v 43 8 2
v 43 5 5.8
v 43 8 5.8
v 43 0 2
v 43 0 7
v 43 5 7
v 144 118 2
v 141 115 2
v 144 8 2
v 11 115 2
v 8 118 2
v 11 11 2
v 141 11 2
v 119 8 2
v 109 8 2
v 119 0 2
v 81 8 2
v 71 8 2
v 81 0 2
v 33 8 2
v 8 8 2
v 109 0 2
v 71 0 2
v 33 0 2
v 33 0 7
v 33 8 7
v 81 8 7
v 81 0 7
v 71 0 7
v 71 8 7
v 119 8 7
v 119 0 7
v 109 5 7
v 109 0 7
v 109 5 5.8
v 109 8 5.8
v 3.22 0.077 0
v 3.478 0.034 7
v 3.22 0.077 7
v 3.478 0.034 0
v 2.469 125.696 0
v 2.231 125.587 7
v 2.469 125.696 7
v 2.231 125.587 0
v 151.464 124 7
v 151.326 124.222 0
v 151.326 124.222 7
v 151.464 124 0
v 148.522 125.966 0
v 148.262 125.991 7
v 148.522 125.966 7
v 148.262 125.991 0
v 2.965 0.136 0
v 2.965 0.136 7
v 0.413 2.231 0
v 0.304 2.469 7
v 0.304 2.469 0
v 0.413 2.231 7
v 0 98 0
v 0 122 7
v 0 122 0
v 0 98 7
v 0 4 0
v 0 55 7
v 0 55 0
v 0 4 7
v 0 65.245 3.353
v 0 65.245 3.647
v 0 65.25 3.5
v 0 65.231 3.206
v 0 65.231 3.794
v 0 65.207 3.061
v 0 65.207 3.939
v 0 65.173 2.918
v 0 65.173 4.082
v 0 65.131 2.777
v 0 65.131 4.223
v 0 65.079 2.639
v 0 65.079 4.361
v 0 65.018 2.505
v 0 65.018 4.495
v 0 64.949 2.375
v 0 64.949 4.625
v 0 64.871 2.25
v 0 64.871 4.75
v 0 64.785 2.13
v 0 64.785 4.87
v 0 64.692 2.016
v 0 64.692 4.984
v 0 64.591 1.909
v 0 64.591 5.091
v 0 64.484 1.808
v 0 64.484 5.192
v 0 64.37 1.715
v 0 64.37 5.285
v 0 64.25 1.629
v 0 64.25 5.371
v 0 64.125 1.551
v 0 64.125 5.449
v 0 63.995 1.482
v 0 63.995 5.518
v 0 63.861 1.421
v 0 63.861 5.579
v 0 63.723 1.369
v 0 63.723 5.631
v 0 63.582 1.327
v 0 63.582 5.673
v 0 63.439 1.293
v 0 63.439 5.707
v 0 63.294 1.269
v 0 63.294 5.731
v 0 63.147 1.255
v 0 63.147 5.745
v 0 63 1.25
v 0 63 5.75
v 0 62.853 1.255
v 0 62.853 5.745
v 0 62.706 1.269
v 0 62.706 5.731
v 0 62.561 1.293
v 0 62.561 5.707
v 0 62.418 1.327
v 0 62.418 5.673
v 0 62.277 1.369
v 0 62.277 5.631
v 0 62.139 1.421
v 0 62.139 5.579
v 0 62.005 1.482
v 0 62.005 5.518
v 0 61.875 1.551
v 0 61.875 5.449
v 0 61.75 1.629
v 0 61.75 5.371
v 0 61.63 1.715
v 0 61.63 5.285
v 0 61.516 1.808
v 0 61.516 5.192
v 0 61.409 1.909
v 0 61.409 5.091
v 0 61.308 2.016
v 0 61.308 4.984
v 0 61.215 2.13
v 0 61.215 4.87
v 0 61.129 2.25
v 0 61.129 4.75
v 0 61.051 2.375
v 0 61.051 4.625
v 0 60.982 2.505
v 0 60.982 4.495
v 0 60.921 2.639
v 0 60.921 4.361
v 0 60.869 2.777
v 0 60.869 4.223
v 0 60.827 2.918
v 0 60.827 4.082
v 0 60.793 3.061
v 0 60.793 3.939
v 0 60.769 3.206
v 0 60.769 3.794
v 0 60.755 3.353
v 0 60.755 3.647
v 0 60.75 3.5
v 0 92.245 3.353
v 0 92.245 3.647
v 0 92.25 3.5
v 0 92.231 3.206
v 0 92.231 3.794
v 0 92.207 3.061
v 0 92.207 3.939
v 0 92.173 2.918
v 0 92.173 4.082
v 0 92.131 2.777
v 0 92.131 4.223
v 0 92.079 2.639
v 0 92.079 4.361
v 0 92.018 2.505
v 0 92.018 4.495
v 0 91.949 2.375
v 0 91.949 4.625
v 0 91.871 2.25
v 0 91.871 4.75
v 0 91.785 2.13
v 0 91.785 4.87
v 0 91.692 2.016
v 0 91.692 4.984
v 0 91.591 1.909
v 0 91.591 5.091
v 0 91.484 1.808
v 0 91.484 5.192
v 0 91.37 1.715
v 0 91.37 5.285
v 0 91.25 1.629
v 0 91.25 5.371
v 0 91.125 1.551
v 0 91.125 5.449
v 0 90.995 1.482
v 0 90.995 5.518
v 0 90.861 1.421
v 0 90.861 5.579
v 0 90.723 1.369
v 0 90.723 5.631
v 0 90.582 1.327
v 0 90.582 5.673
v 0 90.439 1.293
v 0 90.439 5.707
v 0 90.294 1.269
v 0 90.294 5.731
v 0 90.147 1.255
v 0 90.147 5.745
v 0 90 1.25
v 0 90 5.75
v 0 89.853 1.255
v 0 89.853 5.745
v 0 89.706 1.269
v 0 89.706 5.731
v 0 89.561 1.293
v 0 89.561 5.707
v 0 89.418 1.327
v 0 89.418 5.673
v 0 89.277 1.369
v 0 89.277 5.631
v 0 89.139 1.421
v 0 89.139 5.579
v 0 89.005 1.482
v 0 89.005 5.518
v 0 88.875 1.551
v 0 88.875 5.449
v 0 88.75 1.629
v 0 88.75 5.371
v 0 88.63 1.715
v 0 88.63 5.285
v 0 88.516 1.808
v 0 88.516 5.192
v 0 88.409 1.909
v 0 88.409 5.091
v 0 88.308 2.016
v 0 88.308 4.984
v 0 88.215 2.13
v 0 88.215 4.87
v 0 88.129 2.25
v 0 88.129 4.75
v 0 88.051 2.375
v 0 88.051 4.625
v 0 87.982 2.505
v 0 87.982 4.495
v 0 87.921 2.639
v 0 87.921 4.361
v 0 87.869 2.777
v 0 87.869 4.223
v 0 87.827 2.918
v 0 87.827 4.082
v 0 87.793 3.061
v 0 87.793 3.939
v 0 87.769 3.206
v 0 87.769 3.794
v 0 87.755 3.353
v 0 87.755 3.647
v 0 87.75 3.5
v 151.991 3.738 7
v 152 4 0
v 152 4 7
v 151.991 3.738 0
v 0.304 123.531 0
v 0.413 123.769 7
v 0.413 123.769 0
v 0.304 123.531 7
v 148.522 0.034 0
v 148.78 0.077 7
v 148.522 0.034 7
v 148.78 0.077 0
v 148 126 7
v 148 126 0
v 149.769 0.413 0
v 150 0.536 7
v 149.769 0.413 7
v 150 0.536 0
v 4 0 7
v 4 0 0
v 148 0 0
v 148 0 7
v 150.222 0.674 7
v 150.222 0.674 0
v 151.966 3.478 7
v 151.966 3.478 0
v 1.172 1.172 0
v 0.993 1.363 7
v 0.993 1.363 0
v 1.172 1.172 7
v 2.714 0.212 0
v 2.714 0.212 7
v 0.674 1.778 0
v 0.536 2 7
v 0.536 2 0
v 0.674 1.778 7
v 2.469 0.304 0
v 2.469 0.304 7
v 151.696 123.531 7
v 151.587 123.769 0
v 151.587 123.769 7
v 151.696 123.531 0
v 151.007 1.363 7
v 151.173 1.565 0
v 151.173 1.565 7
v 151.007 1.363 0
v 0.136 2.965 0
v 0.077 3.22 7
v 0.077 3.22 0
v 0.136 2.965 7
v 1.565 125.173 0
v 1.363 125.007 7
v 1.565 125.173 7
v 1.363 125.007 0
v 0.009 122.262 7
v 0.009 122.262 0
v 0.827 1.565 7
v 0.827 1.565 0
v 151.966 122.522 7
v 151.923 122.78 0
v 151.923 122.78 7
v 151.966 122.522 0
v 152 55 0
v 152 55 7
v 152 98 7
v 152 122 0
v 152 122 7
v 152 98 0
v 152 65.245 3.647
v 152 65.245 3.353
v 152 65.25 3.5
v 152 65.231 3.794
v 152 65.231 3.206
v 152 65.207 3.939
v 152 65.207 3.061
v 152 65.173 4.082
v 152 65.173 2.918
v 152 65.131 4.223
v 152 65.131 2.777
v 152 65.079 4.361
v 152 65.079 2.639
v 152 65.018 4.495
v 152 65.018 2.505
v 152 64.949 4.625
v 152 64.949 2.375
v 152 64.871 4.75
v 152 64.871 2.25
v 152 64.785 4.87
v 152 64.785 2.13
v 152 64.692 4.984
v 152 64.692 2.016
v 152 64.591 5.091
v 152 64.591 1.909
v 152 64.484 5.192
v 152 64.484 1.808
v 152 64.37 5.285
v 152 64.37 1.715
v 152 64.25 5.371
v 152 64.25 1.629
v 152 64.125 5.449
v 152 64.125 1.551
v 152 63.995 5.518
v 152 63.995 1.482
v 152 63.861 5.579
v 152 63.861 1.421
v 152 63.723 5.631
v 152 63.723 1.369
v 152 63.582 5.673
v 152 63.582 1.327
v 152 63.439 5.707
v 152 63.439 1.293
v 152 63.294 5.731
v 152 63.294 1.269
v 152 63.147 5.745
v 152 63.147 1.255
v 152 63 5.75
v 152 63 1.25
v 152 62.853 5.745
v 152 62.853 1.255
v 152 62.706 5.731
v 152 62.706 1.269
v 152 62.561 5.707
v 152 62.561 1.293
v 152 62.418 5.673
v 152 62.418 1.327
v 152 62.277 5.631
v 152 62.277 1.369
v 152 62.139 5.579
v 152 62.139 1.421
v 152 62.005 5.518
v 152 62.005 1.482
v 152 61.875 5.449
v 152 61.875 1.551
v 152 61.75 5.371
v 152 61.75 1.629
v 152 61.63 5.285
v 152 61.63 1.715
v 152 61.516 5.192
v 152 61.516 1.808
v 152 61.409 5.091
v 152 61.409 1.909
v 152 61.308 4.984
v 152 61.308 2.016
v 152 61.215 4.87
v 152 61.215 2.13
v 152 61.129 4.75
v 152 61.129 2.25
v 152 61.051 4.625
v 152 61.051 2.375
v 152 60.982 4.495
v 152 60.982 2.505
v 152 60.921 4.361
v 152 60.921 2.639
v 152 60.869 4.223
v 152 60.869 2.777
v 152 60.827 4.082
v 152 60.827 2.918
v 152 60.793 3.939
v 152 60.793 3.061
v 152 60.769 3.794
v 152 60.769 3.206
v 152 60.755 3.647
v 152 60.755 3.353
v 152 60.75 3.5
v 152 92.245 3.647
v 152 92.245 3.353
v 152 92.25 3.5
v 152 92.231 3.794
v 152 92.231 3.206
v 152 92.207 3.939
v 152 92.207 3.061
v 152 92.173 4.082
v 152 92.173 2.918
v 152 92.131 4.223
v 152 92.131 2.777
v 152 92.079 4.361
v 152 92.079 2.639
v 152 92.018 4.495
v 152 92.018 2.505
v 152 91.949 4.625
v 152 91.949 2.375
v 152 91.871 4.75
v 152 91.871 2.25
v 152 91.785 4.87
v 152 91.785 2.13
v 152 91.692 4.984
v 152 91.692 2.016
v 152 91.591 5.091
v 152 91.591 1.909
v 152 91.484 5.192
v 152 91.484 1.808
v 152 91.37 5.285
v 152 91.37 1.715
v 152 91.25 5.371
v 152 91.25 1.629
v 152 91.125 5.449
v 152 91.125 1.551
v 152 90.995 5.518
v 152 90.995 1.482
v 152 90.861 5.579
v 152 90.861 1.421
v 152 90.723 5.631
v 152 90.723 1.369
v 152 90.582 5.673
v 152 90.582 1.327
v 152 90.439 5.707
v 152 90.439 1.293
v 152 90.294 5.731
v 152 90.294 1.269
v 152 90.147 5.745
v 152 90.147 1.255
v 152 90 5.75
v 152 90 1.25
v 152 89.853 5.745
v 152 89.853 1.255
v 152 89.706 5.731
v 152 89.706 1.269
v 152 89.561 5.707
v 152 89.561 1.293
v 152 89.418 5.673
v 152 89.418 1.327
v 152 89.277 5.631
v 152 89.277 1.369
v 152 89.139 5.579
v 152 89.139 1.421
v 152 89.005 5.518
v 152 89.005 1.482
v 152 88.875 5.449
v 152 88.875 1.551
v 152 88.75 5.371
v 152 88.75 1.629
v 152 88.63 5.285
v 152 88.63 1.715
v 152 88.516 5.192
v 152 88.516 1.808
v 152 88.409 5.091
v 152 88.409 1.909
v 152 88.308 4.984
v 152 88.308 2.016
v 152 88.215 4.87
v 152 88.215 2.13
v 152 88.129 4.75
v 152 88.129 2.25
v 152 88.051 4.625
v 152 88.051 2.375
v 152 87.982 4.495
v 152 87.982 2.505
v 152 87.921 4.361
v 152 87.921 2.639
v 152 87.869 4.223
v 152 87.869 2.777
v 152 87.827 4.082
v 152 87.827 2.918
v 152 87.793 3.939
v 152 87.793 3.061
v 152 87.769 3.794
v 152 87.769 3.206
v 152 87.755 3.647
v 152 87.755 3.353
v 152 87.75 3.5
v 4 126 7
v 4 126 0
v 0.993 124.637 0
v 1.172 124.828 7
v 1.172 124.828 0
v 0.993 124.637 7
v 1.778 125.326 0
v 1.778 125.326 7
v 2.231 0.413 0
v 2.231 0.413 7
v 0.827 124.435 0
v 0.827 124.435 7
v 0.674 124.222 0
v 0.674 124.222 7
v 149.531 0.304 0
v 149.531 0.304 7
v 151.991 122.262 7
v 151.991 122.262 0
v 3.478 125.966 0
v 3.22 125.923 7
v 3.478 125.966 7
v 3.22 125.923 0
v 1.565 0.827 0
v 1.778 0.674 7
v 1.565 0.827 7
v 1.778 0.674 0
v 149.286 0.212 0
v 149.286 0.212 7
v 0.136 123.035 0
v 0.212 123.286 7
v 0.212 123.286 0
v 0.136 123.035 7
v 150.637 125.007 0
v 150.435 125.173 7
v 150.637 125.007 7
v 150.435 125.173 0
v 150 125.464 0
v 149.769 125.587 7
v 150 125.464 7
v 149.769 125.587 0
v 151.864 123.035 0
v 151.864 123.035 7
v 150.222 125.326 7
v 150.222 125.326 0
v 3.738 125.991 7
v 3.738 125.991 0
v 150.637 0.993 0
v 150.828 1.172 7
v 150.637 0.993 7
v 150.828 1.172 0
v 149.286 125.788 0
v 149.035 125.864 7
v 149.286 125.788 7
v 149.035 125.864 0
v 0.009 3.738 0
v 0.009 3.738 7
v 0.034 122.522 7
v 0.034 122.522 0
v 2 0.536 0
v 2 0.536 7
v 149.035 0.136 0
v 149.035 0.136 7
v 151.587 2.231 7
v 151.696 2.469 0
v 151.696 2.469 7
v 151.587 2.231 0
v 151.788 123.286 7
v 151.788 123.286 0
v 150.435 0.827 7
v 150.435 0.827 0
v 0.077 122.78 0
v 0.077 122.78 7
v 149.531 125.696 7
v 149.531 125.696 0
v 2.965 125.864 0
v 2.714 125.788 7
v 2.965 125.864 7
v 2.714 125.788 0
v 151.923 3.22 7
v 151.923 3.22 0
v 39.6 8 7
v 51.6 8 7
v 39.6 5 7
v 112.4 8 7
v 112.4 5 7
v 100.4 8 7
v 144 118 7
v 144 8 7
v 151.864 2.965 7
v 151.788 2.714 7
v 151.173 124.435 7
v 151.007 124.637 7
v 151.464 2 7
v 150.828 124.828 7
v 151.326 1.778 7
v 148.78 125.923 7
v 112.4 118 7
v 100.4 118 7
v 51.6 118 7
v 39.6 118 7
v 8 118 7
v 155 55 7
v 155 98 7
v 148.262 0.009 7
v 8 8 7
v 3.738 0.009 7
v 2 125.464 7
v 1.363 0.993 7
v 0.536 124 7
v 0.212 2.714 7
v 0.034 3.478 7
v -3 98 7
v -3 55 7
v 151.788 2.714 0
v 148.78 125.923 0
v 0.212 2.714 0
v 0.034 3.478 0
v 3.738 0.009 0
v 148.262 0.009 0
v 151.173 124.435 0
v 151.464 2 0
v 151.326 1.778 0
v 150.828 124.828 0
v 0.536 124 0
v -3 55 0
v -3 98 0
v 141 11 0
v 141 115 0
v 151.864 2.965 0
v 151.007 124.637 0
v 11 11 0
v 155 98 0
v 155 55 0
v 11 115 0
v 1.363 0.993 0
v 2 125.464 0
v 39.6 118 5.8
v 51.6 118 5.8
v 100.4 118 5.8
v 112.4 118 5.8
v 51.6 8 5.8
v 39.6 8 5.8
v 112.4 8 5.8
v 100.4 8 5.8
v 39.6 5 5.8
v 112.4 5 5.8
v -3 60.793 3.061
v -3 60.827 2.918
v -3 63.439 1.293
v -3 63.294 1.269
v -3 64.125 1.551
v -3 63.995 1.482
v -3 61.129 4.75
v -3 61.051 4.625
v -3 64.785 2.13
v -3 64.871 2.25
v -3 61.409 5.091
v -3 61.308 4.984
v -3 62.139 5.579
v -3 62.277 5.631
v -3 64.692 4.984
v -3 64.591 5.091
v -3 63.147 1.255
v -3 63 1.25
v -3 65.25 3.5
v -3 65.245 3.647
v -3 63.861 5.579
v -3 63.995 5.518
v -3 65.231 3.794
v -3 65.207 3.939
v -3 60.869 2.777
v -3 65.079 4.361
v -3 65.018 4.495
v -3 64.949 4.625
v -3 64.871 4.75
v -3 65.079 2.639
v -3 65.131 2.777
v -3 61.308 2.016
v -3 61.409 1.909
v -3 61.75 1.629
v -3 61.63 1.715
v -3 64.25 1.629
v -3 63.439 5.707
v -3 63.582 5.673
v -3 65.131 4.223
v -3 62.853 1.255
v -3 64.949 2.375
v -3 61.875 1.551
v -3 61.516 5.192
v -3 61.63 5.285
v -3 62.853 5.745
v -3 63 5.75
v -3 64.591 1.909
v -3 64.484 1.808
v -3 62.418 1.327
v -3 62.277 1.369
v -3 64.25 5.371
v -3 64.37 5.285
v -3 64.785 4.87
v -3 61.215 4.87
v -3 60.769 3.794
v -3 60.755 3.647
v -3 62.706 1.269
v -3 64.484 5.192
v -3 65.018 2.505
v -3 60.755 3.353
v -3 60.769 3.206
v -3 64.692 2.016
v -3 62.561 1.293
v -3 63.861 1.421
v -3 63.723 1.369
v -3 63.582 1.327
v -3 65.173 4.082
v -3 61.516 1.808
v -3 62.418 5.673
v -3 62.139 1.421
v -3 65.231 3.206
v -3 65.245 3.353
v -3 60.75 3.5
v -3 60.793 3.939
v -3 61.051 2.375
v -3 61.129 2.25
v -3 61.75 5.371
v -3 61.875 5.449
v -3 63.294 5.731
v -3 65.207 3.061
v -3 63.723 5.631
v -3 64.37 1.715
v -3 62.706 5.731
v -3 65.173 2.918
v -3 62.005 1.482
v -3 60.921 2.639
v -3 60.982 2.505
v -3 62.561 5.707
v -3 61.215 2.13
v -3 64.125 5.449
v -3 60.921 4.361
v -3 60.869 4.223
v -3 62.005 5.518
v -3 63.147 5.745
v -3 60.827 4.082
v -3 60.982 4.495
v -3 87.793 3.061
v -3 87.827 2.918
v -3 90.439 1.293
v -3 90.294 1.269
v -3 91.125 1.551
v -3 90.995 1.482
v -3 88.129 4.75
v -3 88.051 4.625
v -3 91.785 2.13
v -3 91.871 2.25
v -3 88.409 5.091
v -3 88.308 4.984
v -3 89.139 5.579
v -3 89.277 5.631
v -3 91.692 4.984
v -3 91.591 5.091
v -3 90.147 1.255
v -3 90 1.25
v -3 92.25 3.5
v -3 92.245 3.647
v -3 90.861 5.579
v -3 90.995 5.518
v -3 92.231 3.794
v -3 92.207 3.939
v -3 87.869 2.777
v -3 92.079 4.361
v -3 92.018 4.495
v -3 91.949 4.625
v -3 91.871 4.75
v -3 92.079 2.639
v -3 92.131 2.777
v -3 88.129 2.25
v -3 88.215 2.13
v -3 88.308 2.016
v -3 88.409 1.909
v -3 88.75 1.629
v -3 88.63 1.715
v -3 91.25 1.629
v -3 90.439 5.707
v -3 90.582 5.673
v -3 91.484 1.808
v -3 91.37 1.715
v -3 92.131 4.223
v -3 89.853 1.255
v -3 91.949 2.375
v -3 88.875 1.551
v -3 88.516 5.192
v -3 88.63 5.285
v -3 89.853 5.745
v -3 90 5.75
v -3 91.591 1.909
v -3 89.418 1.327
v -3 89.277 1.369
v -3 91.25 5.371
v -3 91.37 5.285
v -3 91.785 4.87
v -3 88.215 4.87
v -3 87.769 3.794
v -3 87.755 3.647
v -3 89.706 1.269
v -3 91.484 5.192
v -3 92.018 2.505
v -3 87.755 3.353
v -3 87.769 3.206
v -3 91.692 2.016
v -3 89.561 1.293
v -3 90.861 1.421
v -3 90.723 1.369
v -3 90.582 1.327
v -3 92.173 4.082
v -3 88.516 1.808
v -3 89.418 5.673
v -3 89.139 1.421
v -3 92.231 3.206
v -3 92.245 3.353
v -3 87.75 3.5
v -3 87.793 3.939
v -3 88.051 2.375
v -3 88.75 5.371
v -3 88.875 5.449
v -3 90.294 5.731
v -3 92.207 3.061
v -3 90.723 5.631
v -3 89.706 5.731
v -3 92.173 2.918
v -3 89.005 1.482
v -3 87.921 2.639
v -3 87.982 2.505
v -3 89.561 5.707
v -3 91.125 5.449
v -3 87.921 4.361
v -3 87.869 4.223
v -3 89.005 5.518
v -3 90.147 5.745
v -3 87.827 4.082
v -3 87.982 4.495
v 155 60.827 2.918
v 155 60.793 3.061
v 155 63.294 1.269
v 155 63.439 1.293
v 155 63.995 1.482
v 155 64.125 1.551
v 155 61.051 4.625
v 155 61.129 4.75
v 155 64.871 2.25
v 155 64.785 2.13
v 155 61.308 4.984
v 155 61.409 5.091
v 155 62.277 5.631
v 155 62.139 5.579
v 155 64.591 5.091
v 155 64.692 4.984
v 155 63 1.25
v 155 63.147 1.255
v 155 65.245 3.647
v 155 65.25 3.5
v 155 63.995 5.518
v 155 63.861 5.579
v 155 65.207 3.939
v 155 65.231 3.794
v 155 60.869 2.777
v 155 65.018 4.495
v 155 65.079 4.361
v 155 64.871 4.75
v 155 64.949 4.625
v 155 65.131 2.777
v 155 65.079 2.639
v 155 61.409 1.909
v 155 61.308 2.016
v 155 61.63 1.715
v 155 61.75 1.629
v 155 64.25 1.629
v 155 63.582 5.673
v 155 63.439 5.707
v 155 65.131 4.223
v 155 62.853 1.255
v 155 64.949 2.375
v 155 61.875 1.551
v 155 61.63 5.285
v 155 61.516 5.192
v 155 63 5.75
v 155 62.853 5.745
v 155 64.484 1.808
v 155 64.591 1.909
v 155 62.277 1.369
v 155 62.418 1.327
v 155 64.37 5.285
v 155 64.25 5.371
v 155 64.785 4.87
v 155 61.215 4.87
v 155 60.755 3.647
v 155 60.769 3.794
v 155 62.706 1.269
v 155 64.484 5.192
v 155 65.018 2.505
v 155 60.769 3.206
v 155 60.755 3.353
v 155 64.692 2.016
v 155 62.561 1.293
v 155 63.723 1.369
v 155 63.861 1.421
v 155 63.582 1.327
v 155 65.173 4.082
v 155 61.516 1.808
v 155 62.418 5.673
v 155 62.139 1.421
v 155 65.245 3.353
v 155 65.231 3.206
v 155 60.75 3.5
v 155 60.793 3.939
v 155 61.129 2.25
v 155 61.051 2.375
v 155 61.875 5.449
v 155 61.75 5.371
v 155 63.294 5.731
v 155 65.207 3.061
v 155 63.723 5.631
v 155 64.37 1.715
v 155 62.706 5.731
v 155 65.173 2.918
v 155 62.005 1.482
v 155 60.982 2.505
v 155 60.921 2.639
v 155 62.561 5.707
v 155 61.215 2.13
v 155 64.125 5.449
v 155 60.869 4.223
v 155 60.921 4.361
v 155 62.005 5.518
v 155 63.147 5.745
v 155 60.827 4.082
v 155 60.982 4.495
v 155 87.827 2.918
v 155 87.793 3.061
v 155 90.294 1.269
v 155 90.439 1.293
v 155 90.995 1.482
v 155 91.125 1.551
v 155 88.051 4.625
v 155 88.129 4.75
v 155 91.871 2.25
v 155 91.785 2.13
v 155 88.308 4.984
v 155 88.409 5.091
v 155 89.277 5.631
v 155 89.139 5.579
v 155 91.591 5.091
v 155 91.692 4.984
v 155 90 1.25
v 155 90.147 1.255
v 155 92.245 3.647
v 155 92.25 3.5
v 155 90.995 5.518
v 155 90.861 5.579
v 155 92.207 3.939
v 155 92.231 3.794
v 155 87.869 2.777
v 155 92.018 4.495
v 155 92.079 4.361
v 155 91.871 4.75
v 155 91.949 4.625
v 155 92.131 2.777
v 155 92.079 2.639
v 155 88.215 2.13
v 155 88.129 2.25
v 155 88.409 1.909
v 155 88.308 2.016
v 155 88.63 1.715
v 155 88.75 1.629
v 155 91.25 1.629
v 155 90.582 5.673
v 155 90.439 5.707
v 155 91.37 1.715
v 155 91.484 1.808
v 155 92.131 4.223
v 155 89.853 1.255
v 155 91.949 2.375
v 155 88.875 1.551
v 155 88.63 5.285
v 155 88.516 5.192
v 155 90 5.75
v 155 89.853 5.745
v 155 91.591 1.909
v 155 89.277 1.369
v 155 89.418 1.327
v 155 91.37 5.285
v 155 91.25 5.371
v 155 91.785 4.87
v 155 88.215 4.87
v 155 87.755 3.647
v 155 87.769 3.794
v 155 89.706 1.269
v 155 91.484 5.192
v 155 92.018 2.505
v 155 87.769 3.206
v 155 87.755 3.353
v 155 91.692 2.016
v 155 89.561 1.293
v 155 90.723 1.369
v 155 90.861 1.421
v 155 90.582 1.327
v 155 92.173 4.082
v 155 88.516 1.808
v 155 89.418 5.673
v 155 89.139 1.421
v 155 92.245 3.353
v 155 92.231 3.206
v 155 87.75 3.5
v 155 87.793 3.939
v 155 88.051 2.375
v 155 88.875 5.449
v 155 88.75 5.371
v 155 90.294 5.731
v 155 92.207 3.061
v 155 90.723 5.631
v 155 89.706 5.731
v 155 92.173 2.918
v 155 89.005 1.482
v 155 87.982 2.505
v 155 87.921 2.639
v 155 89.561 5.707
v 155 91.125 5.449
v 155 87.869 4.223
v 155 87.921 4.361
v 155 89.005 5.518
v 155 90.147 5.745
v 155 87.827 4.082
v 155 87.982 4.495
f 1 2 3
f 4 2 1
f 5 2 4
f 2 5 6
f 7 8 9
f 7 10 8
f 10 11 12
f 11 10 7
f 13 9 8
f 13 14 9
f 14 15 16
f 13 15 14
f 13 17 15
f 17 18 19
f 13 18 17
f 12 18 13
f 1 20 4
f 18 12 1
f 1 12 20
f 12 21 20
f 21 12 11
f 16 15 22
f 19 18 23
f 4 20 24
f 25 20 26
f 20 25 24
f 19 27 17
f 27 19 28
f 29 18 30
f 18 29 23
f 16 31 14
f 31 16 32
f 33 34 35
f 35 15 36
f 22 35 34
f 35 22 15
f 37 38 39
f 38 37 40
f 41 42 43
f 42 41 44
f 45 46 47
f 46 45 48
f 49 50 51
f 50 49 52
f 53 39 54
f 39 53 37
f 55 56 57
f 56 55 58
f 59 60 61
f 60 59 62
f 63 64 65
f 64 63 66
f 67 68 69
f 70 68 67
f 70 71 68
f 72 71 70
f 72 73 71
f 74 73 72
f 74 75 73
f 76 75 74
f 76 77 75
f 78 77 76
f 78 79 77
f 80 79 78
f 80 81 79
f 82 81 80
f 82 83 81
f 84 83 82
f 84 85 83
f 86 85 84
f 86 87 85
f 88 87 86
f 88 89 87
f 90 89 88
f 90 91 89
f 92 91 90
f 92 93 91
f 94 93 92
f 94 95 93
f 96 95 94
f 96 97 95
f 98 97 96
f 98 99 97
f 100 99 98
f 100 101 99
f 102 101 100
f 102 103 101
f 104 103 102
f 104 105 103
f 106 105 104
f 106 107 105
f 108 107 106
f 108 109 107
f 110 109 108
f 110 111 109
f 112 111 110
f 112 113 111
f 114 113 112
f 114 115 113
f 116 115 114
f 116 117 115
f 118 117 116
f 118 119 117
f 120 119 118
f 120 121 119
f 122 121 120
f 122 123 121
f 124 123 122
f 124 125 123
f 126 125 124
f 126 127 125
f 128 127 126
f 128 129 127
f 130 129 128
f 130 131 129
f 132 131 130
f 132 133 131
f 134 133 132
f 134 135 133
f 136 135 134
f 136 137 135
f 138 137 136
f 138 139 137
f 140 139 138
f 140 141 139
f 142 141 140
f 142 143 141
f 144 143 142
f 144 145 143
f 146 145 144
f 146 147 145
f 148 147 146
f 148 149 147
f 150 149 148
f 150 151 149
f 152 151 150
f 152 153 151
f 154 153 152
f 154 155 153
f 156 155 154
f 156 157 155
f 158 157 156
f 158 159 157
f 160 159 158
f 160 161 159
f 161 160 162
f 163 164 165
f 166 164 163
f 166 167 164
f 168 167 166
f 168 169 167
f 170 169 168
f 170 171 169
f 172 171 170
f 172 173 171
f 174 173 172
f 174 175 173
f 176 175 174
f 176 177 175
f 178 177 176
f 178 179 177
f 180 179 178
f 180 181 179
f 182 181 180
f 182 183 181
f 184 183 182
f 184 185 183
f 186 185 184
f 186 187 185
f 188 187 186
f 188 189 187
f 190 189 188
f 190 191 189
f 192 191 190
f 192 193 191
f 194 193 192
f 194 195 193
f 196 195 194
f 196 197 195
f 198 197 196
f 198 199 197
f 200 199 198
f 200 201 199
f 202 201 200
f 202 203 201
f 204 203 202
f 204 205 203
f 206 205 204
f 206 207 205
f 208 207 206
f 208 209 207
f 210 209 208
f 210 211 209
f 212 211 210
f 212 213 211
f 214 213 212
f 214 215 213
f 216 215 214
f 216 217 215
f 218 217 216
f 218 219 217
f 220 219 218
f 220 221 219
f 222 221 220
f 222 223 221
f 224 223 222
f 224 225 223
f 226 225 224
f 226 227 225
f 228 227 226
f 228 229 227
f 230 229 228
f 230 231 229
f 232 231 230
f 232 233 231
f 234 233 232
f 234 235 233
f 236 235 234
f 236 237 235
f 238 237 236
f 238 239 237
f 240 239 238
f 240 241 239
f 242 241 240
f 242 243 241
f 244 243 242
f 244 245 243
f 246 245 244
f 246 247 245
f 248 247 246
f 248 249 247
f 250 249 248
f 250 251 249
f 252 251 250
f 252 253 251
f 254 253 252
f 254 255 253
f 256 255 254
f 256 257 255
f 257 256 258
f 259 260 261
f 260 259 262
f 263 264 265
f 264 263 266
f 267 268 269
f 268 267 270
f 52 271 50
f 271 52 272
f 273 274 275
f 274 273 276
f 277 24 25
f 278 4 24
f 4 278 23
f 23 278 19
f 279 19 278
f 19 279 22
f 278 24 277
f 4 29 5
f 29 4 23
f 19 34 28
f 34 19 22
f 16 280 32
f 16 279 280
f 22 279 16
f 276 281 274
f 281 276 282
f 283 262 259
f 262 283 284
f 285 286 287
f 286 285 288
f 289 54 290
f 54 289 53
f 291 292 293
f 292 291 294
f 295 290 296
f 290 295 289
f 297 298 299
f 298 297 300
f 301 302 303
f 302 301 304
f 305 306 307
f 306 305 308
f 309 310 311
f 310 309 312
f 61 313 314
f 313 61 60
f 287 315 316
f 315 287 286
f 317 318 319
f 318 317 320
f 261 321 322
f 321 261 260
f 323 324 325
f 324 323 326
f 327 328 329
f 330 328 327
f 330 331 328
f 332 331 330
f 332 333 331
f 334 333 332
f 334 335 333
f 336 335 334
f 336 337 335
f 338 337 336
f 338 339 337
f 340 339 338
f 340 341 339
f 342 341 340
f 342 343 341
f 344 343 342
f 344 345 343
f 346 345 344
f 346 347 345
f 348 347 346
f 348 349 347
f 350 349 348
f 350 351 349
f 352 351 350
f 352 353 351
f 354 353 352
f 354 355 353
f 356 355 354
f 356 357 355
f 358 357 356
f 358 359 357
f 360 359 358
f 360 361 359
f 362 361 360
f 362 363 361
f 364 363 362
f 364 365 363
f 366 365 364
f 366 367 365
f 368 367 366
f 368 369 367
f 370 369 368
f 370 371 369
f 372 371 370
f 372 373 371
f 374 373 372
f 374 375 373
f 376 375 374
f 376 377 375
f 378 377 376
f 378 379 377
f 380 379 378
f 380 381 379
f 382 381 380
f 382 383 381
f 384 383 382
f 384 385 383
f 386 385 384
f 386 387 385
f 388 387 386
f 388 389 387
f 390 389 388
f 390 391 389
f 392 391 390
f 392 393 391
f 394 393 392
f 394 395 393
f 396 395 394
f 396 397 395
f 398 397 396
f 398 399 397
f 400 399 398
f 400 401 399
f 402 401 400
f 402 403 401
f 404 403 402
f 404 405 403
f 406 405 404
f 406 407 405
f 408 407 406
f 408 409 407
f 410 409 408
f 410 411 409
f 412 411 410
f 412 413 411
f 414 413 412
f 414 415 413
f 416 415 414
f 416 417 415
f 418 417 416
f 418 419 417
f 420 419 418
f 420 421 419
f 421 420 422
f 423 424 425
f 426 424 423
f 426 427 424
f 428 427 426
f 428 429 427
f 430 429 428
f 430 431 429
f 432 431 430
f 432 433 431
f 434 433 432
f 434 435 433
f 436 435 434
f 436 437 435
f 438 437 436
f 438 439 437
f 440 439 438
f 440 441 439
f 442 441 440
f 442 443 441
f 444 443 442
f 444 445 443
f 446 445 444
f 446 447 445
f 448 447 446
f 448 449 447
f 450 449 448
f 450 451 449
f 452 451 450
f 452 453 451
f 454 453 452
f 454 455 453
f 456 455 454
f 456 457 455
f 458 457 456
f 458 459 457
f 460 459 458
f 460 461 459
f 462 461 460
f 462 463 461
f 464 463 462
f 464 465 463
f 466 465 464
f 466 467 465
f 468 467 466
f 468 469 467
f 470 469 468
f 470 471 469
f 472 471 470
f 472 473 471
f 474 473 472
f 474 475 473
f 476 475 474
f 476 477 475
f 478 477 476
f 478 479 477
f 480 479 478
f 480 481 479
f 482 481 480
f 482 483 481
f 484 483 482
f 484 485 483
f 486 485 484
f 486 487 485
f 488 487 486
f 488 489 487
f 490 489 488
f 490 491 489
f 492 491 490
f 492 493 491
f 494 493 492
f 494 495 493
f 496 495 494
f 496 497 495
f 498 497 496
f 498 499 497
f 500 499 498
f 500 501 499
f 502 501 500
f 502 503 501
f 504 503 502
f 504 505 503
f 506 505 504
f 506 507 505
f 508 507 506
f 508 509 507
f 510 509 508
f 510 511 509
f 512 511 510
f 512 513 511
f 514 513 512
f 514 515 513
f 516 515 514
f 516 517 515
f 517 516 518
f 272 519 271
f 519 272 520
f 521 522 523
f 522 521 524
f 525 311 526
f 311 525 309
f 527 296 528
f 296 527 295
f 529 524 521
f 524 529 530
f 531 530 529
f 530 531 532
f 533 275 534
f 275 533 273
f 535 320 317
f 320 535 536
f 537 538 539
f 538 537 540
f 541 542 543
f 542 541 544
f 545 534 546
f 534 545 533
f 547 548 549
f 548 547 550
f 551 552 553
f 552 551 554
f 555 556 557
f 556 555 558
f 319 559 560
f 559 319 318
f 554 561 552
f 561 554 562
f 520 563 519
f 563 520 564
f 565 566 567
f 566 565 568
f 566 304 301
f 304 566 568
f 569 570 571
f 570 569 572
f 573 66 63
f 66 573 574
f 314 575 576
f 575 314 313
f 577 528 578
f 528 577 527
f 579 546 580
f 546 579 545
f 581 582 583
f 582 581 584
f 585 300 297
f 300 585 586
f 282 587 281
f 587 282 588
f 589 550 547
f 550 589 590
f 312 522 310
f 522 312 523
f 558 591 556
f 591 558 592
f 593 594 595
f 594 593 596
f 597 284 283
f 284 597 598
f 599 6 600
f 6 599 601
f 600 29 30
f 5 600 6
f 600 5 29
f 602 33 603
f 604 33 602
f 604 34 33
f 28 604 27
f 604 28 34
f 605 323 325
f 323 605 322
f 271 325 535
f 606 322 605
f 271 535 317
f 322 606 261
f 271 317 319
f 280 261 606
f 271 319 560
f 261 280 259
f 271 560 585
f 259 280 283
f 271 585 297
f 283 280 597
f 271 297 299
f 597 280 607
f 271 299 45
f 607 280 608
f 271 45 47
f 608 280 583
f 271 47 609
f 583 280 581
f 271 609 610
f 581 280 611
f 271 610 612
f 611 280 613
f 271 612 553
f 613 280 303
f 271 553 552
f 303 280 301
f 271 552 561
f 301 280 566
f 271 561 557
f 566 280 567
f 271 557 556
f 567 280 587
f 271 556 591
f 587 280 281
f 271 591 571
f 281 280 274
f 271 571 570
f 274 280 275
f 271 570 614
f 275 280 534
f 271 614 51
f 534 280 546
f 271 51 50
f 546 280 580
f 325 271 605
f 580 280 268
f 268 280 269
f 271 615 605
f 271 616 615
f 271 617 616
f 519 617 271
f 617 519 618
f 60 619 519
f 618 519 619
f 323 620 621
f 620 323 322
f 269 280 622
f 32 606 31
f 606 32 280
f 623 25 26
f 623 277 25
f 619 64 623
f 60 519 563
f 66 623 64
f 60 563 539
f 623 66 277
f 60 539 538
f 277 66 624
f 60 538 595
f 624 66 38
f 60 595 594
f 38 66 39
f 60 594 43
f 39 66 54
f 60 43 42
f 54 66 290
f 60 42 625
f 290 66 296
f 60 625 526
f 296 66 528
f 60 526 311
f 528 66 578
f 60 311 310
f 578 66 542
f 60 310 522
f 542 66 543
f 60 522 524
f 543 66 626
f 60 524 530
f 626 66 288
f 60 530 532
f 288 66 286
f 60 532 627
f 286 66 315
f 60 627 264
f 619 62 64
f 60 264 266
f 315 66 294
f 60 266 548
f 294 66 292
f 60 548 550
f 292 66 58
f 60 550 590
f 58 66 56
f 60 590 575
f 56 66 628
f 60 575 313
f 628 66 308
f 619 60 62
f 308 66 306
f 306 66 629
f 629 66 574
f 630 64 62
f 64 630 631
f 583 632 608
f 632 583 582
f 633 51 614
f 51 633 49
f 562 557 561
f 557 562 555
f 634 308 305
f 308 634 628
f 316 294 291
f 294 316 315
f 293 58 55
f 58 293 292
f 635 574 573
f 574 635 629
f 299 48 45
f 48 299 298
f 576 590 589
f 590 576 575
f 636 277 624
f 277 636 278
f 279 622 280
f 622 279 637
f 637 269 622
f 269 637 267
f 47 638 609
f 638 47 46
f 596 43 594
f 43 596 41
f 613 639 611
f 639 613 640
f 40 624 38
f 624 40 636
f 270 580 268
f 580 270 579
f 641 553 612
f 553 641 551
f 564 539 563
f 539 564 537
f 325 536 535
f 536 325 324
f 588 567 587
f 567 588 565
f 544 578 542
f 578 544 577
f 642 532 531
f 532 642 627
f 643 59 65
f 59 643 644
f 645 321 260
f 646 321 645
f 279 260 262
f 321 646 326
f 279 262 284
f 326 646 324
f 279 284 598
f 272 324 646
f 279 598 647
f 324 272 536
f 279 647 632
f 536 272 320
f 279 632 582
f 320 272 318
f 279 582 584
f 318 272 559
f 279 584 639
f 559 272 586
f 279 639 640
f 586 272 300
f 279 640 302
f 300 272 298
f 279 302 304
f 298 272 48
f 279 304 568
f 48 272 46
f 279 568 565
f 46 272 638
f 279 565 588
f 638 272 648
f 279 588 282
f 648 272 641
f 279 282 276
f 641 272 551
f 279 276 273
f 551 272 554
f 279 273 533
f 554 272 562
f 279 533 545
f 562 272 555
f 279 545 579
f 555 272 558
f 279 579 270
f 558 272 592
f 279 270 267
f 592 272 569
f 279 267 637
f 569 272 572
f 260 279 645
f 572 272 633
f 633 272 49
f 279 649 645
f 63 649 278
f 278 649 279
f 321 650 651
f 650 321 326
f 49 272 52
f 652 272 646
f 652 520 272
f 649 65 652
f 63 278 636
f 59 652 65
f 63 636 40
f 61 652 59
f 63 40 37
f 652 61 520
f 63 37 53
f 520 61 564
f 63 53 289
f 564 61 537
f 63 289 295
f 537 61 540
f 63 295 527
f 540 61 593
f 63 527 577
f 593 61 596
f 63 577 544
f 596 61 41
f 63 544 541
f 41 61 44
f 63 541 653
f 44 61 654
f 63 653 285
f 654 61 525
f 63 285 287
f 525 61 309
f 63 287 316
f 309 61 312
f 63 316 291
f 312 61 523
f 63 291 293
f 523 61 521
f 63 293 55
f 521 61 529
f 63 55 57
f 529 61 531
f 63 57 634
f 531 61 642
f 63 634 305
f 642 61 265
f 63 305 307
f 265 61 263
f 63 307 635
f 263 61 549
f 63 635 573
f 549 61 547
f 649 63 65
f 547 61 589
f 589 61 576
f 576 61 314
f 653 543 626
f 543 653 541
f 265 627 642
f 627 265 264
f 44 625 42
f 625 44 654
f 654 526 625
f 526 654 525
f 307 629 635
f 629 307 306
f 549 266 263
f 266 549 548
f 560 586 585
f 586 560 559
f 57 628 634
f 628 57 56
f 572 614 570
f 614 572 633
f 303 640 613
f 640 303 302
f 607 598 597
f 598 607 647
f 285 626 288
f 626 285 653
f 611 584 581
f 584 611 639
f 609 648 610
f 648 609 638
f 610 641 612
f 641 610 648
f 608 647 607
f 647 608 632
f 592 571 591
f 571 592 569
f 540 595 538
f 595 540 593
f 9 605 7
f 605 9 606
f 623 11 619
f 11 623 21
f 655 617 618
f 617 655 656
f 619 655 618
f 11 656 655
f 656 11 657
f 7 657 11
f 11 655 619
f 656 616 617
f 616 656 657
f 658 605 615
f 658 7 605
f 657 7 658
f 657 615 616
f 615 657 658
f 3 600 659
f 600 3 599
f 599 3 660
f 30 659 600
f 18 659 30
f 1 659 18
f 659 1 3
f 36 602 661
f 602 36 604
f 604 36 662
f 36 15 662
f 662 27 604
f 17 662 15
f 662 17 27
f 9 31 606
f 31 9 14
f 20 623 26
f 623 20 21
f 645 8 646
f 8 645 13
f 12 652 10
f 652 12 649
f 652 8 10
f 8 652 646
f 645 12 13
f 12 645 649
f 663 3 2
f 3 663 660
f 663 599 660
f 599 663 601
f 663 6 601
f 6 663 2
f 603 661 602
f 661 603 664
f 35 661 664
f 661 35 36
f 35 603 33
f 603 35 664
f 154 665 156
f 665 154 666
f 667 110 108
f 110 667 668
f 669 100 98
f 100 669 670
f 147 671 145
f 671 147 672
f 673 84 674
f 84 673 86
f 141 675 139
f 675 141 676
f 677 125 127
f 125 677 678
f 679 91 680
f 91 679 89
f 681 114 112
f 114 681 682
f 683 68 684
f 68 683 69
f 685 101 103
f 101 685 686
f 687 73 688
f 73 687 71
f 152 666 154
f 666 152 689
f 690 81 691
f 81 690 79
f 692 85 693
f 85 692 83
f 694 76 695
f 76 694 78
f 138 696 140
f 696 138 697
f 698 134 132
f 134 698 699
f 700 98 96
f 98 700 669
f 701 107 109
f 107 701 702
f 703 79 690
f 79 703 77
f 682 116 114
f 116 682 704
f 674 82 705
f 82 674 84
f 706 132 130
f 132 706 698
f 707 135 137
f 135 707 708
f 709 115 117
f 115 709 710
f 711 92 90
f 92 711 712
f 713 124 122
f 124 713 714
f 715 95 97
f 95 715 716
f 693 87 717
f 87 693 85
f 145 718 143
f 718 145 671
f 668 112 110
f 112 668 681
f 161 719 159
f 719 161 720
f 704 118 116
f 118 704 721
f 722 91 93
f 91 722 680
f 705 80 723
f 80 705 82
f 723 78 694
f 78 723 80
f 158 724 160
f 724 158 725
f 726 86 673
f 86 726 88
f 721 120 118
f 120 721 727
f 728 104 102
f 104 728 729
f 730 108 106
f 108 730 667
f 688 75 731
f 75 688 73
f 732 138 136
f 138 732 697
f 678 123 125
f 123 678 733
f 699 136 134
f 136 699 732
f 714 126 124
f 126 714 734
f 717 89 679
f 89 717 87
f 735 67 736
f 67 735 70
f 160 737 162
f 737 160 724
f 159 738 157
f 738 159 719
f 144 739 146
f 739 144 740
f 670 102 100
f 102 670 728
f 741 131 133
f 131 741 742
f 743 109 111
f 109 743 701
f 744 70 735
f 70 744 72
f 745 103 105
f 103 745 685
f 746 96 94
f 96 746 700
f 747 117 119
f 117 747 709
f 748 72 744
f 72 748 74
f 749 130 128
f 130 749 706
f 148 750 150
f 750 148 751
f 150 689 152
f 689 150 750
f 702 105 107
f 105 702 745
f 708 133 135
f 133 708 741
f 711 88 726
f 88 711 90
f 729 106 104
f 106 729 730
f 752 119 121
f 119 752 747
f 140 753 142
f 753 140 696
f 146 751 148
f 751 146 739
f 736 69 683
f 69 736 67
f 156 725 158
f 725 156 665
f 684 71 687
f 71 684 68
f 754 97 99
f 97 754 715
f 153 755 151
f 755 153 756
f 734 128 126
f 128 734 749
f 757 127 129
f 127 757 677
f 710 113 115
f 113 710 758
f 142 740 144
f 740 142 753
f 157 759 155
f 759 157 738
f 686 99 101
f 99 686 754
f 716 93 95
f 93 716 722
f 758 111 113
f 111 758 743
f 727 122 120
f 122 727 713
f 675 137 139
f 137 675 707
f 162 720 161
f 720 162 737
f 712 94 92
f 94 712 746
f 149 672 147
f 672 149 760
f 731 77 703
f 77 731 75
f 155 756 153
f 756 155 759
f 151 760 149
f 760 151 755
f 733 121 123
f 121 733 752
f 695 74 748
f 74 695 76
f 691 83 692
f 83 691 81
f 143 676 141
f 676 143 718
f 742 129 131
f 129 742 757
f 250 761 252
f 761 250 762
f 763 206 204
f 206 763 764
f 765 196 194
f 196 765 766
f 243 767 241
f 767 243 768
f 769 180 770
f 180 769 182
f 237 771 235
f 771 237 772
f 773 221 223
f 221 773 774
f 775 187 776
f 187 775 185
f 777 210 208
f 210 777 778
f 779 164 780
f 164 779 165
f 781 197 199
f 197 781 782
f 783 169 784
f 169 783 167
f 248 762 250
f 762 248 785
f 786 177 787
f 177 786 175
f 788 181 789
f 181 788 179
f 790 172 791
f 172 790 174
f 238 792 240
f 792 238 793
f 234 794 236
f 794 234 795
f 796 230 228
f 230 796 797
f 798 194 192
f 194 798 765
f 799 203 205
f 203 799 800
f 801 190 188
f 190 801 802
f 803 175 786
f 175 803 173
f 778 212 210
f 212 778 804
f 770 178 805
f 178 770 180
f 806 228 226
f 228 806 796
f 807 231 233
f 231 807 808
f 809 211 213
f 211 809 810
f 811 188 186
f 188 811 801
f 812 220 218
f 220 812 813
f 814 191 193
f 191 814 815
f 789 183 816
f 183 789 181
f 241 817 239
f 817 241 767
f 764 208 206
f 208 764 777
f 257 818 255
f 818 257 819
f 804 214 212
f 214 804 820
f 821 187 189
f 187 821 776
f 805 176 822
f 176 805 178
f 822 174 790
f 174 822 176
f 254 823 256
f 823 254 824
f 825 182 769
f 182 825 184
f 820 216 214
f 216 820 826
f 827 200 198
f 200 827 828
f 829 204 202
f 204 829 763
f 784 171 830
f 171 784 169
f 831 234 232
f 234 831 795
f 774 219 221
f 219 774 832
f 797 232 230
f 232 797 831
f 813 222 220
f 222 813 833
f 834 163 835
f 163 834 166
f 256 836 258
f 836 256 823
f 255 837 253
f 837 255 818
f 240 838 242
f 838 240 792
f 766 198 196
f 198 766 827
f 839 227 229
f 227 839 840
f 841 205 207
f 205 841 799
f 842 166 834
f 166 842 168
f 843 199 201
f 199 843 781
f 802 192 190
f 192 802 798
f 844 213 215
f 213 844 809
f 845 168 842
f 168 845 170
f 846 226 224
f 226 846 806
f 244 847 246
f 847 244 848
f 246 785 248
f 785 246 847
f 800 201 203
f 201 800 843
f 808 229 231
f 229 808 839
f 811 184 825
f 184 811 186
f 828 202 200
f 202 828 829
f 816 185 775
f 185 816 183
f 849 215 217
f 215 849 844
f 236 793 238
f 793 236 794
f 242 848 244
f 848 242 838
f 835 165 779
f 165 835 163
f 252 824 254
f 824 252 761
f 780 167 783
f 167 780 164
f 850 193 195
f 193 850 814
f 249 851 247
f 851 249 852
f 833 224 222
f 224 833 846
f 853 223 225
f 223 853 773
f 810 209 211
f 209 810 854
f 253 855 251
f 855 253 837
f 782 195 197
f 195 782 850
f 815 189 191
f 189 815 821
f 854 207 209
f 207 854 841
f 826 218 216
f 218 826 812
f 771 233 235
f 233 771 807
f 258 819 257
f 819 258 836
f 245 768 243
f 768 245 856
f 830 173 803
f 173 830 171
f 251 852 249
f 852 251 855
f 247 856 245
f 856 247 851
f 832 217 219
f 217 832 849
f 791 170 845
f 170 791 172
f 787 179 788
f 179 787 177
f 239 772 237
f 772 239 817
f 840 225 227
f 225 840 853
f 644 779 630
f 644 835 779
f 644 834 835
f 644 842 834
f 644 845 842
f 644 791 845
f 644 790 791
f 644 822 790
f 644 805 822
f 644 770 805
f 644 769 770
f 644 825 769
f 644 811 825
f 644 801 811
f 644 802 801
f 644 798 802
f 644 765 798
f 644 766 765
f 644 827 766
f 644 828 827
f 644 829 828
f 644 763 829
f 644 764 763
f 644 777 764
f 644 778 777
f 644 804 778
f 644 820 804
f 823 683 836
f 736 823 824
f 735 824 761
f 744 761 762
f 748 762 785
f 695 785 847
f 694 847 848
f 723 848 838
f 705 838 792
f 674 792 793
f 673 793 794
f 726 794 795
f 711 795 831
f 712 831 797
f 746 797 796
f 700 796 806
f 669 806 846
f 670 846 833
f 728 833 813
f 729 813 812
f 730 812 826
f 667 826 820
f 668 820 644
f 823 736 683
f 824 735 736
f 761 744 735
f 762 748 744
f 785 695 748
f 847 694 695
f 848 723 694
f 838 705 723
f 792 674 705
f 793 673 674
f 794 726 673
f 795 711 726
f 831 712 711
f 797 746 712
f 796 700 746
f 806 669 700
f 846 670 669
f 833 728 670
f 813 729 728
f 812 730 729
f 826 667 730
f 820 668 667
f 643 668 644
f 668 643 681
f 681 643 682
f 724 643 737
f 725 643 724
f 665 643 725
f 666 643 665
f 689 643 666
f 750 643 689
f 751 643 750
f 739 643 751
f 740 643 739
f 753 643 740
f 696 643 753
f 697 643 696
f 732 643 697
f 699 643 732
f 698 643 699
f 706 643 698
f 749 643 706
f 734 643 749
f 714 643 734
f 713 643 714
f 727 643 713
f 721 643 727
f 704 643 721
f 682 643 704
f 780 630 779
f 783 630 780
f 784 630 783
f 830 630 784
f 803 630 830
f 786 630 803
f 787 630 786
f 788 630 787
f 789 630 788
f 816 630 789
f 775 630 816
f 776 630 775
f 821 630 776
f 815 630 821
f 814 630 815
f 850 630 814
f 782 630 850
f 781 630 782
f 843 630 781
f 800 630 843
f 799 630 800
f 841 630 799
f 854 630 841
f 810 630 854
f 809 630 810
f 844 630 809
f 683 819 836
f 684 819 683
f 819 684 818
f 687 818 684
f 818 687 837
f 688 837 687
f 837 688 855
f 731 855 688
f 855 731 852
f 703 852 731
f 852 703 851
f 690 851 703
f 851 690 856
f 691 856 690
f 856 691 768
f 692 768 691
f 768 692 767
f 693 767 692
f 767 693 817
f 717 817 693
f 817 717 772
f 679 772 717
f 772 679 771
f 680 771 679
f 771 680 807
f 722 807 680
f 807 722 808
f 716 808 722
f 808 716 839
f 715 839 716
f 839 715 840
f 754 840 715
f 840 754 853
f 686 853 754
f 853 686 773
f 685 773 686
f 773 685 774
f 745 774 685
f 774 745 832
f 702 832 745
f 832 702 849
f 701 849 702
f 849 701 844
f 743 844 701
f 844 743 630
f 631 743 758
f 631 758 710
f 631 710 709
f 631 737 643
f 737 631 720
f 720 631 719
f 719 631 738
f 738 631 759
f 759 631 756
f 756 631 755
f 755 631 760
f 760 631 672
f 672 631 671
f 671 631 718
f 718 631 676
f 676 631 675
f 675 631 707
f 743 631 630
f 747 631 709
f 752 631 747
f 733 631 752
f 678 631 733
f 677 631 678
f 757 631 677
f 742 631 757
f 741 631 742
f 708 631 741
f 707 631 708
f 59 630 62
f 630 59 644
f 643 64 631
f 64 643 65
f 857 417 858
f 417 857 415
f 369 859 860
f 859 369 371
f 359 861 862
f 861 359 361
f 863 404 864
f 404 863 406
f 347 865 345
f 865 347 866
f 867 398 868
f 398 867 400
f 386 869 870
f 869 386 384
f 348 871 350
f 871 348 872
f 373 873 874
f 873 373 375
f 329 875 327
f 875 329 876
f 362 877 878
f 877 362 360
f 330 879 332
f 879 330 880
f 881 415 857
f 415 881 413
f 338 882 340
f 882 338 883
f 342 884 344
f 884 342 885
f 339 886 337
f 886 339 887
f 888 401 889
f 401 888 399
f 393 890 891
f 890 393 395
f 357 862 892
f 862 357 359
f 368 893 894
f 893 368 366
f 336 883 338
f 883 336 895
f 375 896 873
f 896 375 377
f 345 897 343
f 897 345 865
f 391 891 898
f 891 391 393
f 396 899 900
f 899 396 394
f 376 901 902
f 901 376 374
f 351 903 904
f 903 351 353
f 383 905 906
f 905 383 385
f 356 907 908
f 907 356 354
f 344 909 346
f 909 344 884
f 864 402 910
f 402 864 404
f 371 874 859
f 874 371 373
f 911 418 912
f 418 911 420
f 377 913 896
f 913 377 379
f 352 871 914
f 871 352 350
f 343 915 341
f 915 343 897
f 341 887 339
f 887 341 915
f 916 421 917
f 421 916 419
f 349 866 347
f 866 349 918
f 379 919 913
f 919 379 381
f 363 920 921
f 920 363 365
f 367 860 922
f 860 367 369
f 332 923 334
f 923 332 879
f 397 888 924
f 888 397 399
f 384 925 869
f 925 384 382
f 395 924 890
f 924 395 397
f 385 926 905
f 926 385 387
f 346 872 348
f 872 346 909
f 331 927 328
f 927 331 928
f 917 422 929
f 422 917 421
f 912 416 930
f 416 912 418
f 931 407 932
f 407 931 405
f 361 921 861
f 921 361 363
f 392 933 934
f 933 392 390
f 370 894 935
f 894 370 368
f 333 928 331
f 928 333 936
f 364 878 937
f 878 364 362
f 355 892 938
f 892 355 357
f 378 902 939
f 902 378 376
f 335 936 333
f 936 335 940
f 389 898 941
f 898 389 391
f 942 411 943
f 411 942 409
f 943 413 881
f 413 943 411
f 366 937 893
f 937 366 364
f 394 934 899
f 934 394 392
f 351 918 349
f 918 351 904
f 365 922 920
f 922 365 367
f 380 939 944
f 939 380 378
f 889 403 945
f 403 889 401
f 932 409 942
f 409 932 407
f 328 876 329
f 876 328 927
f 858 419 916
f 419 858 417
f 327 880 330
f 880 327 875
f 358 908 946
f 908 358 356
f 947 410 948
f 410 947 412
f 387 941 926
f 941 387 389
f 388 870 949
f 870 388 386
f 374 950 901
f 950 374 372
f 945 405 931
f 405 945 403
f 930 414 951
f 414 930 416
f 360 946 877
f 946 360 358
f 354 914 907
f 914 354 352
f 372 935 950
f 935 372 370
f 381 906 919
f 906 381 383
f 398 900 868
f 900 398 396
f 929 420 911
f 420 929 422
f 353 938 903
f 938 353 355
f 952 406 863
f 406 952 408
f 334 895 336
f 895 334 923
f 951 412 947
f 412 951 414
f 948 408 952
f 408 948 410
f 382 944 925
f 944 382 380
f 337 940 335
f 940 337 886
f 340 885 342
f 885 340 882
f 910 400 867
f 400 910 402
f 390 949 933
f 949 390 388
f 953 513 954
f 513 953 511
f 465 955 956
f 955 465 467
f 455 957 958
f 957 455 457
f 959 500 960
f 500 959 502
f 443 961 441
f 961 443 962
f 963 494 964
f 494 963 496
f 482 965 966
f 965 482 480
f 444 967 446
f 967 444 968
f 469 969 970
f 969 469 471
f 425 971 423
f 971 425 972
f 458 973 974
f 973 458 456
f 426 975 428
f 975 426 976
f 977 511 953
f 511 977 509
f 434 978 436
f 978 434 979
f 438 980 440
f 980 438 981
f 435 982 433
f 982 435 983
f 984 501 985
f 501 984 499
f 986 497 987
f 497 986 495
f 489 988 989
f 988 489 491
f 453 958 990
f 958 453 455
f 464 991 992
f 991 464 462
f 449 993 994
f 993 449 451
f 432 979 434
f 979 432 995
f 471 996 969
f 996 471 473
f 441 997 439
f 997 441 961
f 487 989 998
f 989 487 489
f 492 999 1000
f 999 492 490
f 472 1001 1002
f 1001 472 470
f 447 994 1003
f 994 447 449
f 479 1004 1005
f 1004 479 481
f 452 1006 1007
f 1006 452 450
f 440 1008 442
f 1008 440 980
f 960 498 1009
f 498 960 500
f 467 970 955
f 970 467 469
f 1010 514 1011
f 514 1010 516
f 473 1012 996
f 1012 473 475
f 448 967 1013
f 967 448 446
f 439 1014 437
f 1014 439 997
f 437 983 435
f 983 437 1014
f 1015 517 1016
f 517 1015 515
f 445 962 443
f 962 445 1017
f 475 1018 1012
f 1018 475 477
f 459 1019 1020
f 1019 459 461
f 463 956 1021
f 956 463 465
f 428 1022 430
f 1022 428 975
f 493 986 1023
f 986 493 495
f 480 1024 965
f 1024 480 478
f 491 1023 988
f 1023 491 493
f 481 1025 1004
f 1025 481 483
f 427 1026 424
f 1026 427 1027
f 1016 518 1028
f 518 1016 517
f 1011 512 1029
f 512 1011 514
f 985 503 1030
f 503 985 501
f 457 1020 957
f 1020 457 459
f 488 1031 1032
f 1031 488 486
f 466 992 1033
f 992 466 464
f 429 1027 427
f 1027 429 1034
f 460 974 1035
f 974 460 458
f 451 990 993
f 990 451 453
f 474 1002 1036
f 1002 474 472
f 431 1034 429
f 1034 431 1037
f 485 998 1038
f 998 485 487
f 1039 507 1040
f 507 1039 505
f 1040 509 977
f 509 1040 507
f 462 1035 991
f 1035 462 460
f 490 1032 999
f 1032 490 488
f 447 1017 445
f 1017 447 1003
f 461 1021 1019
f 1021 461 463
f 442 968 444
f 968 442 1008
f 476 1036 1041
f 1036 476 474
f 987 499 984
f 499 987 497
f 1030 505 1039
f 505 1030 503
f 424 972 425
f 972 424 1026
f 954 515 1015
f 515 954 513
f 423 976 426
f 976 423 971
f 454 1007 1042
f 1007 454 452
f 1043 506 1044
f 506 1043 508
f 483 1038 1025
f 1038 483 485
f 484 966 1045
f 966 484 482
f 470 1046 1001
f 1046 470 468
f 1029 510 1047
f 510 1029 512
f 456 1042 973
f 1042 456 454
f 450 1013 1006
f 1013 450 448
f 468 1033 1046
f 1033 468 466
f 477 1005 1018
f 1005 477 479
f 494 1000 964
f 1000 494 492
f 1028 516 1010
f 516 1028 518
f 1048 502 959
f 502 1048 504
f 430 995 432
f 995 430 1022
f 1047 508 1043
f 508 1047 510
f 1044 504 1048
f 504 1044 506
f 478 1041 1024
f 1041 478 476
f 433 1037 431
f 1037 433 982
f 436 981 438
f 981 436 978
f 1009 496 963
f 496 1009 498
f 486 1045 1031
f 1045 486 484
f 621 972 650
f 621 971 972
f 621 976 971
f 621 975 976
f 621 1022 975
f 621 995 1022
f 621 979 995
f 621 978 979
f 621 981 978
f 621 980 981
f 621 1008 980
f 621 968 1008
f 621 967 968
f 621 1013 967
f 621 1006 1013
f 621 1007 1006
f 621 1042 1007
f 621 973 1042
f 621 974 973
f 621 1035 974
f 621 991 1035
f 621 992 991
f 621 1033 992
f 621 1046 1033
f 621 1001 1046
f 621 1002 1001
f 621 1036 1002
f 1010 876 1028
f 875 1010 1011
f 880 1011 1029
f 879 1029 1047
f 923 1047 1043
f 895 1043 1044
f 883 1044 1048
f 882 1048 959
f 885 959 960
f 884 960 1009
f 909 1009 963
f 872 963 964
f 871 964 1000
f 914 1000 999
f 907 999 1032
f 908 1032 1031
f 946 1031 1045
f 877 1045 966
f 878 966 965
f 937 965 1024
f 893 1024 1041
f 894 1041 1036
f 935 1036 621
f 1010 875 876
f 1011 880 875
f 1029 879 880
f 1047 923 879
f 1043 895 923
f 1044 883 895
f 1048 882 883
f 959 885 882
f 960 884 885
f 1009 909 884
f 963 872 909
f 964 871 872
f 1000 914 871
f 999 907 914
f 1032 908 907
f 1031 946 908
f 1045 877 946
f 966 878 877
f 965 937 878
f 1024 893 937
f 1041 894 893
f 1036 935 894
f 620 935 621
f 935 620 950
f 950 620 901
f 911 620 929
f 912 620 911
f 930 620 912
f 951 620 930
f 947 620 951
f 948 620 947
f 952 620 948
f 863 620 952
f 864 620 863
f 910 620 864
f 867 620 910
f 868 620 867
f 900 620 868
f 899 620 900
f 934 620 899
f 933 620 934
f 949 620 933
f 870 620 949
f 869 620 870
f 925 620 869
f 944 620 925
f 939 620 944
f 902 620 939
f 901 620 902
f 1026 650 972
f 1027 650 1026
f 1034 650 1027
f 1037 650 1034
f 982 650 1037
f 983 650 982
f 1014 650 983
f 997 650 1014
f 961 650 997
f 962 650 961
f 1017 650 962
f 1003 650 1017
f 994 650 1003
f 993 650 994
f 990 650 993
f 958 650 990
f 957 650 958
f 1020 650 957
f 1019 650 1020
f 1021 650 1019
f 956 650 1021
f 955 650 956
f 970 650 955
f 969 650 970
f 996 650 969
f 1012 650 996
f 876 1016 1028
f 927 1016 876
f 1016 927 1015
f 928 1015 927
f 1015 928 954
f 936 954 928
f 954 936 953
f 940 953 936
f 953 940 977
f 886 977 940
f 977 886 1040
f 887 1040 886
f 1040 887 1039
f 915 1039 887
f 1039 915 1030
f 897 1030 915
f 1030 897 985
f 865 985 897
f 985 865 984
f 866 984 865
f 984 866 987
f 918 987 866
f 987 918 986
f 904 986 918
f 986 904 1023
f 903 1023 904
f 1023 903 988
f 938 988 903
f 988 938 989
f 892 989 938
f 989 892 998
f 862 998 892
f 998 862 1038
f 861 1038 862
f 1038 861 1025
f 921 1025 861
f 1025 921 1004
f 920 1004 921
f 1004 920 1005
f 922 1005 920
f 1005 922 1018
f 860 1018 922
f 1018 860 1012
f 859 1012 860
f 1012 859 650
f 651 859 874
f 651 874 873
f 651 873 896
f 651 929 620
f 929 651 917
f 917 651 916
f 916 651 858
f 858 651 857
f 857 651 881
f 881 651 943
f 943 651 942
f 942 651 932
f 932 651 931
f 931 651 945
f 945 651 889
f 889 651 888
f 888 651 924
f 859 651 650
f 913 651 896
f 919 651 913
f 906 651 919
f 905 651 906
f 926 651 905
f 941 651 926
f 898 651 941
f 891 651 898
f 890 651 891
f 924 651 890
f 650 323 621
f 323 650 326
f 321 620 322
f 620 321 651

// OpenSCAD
// file: common.scad
// Shared dimensions for the weather station parts. Every part that goes on the pole
// bolts to a pole saddle (pole_saddle.scad) through the same 40 x 40 mm M4 pattern.
// Print in PETG (or ASA): 0.2 mm layers, 4 walls, 30 % gyroid unless a file says otherwise.

$fn = 96;

pole_d = 40;            // outside diameter of your pole, mm (32-40 typical)
mount_pitch = 40;       // M4 bolt square shared by every part
m4_clear = 4.5;         // M4 clearance hole
m4_insert_d = 5.6;      // hole for an M4 x 6 heat-set insert (check your inserts)
m4_insert_h = 6.5;
m5_clear = 5.5;         // M5 rods of the radiation shield
clamp_w = 14;           // worm-drive hose clamp band width + 1 mm
clamp_t = 2.5;          // band thickness + clearance

// Four holes on the shared mounting square, centred on the origin, along Z.
module mount_holes(d = m4_clear, h = 50) {
    for (x = [-1, 1], y = [-1, 1])
        translate([x * mount_pitch / 2, y * mount_pitch / 2, -h / 2])
            cylinder(d = d, h = h);
}

module rounded_box(size, r = 4) {
    hull()
        for (x = [r, size[0] - r], y = [r, size[1] - r])
            translate([x, y, 0]) cylinder(r = r, h = size[2]);
}
// main file
// Solar panel bracket: a frame that holds the panel, tilting between 45 and 70 degrees on
// two cheeks bolted to a pole saddle. Mount it just above the electronics box: the panel
// then also shades the box and the battery.
// Print `part` = "frame" flat, "cheeks" flat (one part, two cheeks on a base plate).
// Tilt: M4 pivot bolt + M4 bolt in the arc slot, tighten at about 60 degrees facing south.

include <common.scad>

part = "frame";      // "frame", "cheeks" or "assembly" (preview only)

panel = [136, 110, 3];   // your panel: width, height, thickness (2 W 6 V panels are often 136 x 110)
lip = 3;                 // how much the frame overlaps the panel's edge
frame_w = 8;
frame_t = panel[2] + 4;
cheek_gap = panel[0] + 2 * frame_w + 1;   // the frame sits between the cheeks
cheek_t = 6;
cheek_r = 45;            // pivot to the arc slot

module frame() {
    outer = [panel[0] + 2 * frame_w, panel[1] + 2 * frame_w, frame_t];
    difference() {
        rounded_box(outer, r = 4);
        // pocket for the panel, open on top
        translate([frame_w, frame_w, 2]) cube([panel[0], panel[1], frame_t]);
        // window under the panel (keeps it cool, saves filament)
        translate([frame_w + lip, frame_w + lip, -1]) cube([panel[0] - 2 * lip, panel[1] - 2 * lip, frame_t]);
        // drain notches on the lower edge
        for (x = [0.25, 0.5, 0.75]) translate([outer[0] * x - 5, -1, 2]) cube([10, frame_w + 2, frame_t]);
    }
    // clips that hold the panel in its pocket (snap the panel under them)
    for (x = [0.3, 0.7], y = [0, 1])
        translate([outer[0] * x - 6, y == 0 ? frame_w - lip : outer[1] - frame_w, frame_t - 1.2])
            cube([12, lip, 1.2]);
    // side ears: pivot hole at the middle of the frame, slot bolt hole 27 mm further up
    for (side = [0, 1])
        translate([side == 0 ? -cheek_t / 2 : outer[0] - 0.01, outer[1] / 2 - 8, 0])
            difference() {
                cube([cheek_t / 2 + 0.01, 8 + cheek_r * 0.6 + 8, frame_t]);
                for (y = [8, 8 + cheek_r * 0.6])
                    translate([-1, y, frame_t / 2]) rotate([0, 90, 0]) cylinder(d = m4_clear, h = cheek_t + 2);
            }
}

module cheek() {
    difference() {
        hull() {
            cylinder(r = 10, h = cheek_t);
            translate([-20, -cheek_r - 10, 0]) cube([40, 1, cheek_t]);
        }
        // pivot
        translate([0, 0, -1]) cylinder(d = m4_clear, h = cheek_t + 2);
        // arc slot: 45 to 70 degrees of tilt
        for (a = [45 : 1 : 70])
            hull() {
                rotate([0, 0, -90 + (a - 45)]) translate([cheek_r * 0.6, 0, -1]) cylinder(d = m4_clear, h = cheek_t + 2);
                rotate([0, 0, -90 + (a - 44)]) translate([cheek_r * 0.6, 0, -1]) cylinder(d = m4_clear, h = cheek_t + 2);
            }
    }
}

module cheeks() {
    base = [cheek_gap + 2 * cheek_t, 56, 6];
    difference() {
        translate([-base[0] / 2, -base[1] / 2, 0]) rounded_box(base, r = 4);
        mount_holes();
    }
    // the two cheeks stand on the base plate
    for (x = [-cheek_gap / 2 - cheek_t, cheek_gap / 2])
        translate([x, 0, base[2] + cheek_r + 10]) rotate([90, 0, 90]) cheek();
}

if (part == "frame") frame();
else if (part == "cheeks") cheeks();
else {
    cheeks();
    translate([-(panel[0] + 2 * frame_w) / 2, 0, 6 + cheek_r + 10]) rotate([60, 0, 0]) translate([0, -(panel[1] + 2 * frame_w) / 2, 0]) frame();
}
